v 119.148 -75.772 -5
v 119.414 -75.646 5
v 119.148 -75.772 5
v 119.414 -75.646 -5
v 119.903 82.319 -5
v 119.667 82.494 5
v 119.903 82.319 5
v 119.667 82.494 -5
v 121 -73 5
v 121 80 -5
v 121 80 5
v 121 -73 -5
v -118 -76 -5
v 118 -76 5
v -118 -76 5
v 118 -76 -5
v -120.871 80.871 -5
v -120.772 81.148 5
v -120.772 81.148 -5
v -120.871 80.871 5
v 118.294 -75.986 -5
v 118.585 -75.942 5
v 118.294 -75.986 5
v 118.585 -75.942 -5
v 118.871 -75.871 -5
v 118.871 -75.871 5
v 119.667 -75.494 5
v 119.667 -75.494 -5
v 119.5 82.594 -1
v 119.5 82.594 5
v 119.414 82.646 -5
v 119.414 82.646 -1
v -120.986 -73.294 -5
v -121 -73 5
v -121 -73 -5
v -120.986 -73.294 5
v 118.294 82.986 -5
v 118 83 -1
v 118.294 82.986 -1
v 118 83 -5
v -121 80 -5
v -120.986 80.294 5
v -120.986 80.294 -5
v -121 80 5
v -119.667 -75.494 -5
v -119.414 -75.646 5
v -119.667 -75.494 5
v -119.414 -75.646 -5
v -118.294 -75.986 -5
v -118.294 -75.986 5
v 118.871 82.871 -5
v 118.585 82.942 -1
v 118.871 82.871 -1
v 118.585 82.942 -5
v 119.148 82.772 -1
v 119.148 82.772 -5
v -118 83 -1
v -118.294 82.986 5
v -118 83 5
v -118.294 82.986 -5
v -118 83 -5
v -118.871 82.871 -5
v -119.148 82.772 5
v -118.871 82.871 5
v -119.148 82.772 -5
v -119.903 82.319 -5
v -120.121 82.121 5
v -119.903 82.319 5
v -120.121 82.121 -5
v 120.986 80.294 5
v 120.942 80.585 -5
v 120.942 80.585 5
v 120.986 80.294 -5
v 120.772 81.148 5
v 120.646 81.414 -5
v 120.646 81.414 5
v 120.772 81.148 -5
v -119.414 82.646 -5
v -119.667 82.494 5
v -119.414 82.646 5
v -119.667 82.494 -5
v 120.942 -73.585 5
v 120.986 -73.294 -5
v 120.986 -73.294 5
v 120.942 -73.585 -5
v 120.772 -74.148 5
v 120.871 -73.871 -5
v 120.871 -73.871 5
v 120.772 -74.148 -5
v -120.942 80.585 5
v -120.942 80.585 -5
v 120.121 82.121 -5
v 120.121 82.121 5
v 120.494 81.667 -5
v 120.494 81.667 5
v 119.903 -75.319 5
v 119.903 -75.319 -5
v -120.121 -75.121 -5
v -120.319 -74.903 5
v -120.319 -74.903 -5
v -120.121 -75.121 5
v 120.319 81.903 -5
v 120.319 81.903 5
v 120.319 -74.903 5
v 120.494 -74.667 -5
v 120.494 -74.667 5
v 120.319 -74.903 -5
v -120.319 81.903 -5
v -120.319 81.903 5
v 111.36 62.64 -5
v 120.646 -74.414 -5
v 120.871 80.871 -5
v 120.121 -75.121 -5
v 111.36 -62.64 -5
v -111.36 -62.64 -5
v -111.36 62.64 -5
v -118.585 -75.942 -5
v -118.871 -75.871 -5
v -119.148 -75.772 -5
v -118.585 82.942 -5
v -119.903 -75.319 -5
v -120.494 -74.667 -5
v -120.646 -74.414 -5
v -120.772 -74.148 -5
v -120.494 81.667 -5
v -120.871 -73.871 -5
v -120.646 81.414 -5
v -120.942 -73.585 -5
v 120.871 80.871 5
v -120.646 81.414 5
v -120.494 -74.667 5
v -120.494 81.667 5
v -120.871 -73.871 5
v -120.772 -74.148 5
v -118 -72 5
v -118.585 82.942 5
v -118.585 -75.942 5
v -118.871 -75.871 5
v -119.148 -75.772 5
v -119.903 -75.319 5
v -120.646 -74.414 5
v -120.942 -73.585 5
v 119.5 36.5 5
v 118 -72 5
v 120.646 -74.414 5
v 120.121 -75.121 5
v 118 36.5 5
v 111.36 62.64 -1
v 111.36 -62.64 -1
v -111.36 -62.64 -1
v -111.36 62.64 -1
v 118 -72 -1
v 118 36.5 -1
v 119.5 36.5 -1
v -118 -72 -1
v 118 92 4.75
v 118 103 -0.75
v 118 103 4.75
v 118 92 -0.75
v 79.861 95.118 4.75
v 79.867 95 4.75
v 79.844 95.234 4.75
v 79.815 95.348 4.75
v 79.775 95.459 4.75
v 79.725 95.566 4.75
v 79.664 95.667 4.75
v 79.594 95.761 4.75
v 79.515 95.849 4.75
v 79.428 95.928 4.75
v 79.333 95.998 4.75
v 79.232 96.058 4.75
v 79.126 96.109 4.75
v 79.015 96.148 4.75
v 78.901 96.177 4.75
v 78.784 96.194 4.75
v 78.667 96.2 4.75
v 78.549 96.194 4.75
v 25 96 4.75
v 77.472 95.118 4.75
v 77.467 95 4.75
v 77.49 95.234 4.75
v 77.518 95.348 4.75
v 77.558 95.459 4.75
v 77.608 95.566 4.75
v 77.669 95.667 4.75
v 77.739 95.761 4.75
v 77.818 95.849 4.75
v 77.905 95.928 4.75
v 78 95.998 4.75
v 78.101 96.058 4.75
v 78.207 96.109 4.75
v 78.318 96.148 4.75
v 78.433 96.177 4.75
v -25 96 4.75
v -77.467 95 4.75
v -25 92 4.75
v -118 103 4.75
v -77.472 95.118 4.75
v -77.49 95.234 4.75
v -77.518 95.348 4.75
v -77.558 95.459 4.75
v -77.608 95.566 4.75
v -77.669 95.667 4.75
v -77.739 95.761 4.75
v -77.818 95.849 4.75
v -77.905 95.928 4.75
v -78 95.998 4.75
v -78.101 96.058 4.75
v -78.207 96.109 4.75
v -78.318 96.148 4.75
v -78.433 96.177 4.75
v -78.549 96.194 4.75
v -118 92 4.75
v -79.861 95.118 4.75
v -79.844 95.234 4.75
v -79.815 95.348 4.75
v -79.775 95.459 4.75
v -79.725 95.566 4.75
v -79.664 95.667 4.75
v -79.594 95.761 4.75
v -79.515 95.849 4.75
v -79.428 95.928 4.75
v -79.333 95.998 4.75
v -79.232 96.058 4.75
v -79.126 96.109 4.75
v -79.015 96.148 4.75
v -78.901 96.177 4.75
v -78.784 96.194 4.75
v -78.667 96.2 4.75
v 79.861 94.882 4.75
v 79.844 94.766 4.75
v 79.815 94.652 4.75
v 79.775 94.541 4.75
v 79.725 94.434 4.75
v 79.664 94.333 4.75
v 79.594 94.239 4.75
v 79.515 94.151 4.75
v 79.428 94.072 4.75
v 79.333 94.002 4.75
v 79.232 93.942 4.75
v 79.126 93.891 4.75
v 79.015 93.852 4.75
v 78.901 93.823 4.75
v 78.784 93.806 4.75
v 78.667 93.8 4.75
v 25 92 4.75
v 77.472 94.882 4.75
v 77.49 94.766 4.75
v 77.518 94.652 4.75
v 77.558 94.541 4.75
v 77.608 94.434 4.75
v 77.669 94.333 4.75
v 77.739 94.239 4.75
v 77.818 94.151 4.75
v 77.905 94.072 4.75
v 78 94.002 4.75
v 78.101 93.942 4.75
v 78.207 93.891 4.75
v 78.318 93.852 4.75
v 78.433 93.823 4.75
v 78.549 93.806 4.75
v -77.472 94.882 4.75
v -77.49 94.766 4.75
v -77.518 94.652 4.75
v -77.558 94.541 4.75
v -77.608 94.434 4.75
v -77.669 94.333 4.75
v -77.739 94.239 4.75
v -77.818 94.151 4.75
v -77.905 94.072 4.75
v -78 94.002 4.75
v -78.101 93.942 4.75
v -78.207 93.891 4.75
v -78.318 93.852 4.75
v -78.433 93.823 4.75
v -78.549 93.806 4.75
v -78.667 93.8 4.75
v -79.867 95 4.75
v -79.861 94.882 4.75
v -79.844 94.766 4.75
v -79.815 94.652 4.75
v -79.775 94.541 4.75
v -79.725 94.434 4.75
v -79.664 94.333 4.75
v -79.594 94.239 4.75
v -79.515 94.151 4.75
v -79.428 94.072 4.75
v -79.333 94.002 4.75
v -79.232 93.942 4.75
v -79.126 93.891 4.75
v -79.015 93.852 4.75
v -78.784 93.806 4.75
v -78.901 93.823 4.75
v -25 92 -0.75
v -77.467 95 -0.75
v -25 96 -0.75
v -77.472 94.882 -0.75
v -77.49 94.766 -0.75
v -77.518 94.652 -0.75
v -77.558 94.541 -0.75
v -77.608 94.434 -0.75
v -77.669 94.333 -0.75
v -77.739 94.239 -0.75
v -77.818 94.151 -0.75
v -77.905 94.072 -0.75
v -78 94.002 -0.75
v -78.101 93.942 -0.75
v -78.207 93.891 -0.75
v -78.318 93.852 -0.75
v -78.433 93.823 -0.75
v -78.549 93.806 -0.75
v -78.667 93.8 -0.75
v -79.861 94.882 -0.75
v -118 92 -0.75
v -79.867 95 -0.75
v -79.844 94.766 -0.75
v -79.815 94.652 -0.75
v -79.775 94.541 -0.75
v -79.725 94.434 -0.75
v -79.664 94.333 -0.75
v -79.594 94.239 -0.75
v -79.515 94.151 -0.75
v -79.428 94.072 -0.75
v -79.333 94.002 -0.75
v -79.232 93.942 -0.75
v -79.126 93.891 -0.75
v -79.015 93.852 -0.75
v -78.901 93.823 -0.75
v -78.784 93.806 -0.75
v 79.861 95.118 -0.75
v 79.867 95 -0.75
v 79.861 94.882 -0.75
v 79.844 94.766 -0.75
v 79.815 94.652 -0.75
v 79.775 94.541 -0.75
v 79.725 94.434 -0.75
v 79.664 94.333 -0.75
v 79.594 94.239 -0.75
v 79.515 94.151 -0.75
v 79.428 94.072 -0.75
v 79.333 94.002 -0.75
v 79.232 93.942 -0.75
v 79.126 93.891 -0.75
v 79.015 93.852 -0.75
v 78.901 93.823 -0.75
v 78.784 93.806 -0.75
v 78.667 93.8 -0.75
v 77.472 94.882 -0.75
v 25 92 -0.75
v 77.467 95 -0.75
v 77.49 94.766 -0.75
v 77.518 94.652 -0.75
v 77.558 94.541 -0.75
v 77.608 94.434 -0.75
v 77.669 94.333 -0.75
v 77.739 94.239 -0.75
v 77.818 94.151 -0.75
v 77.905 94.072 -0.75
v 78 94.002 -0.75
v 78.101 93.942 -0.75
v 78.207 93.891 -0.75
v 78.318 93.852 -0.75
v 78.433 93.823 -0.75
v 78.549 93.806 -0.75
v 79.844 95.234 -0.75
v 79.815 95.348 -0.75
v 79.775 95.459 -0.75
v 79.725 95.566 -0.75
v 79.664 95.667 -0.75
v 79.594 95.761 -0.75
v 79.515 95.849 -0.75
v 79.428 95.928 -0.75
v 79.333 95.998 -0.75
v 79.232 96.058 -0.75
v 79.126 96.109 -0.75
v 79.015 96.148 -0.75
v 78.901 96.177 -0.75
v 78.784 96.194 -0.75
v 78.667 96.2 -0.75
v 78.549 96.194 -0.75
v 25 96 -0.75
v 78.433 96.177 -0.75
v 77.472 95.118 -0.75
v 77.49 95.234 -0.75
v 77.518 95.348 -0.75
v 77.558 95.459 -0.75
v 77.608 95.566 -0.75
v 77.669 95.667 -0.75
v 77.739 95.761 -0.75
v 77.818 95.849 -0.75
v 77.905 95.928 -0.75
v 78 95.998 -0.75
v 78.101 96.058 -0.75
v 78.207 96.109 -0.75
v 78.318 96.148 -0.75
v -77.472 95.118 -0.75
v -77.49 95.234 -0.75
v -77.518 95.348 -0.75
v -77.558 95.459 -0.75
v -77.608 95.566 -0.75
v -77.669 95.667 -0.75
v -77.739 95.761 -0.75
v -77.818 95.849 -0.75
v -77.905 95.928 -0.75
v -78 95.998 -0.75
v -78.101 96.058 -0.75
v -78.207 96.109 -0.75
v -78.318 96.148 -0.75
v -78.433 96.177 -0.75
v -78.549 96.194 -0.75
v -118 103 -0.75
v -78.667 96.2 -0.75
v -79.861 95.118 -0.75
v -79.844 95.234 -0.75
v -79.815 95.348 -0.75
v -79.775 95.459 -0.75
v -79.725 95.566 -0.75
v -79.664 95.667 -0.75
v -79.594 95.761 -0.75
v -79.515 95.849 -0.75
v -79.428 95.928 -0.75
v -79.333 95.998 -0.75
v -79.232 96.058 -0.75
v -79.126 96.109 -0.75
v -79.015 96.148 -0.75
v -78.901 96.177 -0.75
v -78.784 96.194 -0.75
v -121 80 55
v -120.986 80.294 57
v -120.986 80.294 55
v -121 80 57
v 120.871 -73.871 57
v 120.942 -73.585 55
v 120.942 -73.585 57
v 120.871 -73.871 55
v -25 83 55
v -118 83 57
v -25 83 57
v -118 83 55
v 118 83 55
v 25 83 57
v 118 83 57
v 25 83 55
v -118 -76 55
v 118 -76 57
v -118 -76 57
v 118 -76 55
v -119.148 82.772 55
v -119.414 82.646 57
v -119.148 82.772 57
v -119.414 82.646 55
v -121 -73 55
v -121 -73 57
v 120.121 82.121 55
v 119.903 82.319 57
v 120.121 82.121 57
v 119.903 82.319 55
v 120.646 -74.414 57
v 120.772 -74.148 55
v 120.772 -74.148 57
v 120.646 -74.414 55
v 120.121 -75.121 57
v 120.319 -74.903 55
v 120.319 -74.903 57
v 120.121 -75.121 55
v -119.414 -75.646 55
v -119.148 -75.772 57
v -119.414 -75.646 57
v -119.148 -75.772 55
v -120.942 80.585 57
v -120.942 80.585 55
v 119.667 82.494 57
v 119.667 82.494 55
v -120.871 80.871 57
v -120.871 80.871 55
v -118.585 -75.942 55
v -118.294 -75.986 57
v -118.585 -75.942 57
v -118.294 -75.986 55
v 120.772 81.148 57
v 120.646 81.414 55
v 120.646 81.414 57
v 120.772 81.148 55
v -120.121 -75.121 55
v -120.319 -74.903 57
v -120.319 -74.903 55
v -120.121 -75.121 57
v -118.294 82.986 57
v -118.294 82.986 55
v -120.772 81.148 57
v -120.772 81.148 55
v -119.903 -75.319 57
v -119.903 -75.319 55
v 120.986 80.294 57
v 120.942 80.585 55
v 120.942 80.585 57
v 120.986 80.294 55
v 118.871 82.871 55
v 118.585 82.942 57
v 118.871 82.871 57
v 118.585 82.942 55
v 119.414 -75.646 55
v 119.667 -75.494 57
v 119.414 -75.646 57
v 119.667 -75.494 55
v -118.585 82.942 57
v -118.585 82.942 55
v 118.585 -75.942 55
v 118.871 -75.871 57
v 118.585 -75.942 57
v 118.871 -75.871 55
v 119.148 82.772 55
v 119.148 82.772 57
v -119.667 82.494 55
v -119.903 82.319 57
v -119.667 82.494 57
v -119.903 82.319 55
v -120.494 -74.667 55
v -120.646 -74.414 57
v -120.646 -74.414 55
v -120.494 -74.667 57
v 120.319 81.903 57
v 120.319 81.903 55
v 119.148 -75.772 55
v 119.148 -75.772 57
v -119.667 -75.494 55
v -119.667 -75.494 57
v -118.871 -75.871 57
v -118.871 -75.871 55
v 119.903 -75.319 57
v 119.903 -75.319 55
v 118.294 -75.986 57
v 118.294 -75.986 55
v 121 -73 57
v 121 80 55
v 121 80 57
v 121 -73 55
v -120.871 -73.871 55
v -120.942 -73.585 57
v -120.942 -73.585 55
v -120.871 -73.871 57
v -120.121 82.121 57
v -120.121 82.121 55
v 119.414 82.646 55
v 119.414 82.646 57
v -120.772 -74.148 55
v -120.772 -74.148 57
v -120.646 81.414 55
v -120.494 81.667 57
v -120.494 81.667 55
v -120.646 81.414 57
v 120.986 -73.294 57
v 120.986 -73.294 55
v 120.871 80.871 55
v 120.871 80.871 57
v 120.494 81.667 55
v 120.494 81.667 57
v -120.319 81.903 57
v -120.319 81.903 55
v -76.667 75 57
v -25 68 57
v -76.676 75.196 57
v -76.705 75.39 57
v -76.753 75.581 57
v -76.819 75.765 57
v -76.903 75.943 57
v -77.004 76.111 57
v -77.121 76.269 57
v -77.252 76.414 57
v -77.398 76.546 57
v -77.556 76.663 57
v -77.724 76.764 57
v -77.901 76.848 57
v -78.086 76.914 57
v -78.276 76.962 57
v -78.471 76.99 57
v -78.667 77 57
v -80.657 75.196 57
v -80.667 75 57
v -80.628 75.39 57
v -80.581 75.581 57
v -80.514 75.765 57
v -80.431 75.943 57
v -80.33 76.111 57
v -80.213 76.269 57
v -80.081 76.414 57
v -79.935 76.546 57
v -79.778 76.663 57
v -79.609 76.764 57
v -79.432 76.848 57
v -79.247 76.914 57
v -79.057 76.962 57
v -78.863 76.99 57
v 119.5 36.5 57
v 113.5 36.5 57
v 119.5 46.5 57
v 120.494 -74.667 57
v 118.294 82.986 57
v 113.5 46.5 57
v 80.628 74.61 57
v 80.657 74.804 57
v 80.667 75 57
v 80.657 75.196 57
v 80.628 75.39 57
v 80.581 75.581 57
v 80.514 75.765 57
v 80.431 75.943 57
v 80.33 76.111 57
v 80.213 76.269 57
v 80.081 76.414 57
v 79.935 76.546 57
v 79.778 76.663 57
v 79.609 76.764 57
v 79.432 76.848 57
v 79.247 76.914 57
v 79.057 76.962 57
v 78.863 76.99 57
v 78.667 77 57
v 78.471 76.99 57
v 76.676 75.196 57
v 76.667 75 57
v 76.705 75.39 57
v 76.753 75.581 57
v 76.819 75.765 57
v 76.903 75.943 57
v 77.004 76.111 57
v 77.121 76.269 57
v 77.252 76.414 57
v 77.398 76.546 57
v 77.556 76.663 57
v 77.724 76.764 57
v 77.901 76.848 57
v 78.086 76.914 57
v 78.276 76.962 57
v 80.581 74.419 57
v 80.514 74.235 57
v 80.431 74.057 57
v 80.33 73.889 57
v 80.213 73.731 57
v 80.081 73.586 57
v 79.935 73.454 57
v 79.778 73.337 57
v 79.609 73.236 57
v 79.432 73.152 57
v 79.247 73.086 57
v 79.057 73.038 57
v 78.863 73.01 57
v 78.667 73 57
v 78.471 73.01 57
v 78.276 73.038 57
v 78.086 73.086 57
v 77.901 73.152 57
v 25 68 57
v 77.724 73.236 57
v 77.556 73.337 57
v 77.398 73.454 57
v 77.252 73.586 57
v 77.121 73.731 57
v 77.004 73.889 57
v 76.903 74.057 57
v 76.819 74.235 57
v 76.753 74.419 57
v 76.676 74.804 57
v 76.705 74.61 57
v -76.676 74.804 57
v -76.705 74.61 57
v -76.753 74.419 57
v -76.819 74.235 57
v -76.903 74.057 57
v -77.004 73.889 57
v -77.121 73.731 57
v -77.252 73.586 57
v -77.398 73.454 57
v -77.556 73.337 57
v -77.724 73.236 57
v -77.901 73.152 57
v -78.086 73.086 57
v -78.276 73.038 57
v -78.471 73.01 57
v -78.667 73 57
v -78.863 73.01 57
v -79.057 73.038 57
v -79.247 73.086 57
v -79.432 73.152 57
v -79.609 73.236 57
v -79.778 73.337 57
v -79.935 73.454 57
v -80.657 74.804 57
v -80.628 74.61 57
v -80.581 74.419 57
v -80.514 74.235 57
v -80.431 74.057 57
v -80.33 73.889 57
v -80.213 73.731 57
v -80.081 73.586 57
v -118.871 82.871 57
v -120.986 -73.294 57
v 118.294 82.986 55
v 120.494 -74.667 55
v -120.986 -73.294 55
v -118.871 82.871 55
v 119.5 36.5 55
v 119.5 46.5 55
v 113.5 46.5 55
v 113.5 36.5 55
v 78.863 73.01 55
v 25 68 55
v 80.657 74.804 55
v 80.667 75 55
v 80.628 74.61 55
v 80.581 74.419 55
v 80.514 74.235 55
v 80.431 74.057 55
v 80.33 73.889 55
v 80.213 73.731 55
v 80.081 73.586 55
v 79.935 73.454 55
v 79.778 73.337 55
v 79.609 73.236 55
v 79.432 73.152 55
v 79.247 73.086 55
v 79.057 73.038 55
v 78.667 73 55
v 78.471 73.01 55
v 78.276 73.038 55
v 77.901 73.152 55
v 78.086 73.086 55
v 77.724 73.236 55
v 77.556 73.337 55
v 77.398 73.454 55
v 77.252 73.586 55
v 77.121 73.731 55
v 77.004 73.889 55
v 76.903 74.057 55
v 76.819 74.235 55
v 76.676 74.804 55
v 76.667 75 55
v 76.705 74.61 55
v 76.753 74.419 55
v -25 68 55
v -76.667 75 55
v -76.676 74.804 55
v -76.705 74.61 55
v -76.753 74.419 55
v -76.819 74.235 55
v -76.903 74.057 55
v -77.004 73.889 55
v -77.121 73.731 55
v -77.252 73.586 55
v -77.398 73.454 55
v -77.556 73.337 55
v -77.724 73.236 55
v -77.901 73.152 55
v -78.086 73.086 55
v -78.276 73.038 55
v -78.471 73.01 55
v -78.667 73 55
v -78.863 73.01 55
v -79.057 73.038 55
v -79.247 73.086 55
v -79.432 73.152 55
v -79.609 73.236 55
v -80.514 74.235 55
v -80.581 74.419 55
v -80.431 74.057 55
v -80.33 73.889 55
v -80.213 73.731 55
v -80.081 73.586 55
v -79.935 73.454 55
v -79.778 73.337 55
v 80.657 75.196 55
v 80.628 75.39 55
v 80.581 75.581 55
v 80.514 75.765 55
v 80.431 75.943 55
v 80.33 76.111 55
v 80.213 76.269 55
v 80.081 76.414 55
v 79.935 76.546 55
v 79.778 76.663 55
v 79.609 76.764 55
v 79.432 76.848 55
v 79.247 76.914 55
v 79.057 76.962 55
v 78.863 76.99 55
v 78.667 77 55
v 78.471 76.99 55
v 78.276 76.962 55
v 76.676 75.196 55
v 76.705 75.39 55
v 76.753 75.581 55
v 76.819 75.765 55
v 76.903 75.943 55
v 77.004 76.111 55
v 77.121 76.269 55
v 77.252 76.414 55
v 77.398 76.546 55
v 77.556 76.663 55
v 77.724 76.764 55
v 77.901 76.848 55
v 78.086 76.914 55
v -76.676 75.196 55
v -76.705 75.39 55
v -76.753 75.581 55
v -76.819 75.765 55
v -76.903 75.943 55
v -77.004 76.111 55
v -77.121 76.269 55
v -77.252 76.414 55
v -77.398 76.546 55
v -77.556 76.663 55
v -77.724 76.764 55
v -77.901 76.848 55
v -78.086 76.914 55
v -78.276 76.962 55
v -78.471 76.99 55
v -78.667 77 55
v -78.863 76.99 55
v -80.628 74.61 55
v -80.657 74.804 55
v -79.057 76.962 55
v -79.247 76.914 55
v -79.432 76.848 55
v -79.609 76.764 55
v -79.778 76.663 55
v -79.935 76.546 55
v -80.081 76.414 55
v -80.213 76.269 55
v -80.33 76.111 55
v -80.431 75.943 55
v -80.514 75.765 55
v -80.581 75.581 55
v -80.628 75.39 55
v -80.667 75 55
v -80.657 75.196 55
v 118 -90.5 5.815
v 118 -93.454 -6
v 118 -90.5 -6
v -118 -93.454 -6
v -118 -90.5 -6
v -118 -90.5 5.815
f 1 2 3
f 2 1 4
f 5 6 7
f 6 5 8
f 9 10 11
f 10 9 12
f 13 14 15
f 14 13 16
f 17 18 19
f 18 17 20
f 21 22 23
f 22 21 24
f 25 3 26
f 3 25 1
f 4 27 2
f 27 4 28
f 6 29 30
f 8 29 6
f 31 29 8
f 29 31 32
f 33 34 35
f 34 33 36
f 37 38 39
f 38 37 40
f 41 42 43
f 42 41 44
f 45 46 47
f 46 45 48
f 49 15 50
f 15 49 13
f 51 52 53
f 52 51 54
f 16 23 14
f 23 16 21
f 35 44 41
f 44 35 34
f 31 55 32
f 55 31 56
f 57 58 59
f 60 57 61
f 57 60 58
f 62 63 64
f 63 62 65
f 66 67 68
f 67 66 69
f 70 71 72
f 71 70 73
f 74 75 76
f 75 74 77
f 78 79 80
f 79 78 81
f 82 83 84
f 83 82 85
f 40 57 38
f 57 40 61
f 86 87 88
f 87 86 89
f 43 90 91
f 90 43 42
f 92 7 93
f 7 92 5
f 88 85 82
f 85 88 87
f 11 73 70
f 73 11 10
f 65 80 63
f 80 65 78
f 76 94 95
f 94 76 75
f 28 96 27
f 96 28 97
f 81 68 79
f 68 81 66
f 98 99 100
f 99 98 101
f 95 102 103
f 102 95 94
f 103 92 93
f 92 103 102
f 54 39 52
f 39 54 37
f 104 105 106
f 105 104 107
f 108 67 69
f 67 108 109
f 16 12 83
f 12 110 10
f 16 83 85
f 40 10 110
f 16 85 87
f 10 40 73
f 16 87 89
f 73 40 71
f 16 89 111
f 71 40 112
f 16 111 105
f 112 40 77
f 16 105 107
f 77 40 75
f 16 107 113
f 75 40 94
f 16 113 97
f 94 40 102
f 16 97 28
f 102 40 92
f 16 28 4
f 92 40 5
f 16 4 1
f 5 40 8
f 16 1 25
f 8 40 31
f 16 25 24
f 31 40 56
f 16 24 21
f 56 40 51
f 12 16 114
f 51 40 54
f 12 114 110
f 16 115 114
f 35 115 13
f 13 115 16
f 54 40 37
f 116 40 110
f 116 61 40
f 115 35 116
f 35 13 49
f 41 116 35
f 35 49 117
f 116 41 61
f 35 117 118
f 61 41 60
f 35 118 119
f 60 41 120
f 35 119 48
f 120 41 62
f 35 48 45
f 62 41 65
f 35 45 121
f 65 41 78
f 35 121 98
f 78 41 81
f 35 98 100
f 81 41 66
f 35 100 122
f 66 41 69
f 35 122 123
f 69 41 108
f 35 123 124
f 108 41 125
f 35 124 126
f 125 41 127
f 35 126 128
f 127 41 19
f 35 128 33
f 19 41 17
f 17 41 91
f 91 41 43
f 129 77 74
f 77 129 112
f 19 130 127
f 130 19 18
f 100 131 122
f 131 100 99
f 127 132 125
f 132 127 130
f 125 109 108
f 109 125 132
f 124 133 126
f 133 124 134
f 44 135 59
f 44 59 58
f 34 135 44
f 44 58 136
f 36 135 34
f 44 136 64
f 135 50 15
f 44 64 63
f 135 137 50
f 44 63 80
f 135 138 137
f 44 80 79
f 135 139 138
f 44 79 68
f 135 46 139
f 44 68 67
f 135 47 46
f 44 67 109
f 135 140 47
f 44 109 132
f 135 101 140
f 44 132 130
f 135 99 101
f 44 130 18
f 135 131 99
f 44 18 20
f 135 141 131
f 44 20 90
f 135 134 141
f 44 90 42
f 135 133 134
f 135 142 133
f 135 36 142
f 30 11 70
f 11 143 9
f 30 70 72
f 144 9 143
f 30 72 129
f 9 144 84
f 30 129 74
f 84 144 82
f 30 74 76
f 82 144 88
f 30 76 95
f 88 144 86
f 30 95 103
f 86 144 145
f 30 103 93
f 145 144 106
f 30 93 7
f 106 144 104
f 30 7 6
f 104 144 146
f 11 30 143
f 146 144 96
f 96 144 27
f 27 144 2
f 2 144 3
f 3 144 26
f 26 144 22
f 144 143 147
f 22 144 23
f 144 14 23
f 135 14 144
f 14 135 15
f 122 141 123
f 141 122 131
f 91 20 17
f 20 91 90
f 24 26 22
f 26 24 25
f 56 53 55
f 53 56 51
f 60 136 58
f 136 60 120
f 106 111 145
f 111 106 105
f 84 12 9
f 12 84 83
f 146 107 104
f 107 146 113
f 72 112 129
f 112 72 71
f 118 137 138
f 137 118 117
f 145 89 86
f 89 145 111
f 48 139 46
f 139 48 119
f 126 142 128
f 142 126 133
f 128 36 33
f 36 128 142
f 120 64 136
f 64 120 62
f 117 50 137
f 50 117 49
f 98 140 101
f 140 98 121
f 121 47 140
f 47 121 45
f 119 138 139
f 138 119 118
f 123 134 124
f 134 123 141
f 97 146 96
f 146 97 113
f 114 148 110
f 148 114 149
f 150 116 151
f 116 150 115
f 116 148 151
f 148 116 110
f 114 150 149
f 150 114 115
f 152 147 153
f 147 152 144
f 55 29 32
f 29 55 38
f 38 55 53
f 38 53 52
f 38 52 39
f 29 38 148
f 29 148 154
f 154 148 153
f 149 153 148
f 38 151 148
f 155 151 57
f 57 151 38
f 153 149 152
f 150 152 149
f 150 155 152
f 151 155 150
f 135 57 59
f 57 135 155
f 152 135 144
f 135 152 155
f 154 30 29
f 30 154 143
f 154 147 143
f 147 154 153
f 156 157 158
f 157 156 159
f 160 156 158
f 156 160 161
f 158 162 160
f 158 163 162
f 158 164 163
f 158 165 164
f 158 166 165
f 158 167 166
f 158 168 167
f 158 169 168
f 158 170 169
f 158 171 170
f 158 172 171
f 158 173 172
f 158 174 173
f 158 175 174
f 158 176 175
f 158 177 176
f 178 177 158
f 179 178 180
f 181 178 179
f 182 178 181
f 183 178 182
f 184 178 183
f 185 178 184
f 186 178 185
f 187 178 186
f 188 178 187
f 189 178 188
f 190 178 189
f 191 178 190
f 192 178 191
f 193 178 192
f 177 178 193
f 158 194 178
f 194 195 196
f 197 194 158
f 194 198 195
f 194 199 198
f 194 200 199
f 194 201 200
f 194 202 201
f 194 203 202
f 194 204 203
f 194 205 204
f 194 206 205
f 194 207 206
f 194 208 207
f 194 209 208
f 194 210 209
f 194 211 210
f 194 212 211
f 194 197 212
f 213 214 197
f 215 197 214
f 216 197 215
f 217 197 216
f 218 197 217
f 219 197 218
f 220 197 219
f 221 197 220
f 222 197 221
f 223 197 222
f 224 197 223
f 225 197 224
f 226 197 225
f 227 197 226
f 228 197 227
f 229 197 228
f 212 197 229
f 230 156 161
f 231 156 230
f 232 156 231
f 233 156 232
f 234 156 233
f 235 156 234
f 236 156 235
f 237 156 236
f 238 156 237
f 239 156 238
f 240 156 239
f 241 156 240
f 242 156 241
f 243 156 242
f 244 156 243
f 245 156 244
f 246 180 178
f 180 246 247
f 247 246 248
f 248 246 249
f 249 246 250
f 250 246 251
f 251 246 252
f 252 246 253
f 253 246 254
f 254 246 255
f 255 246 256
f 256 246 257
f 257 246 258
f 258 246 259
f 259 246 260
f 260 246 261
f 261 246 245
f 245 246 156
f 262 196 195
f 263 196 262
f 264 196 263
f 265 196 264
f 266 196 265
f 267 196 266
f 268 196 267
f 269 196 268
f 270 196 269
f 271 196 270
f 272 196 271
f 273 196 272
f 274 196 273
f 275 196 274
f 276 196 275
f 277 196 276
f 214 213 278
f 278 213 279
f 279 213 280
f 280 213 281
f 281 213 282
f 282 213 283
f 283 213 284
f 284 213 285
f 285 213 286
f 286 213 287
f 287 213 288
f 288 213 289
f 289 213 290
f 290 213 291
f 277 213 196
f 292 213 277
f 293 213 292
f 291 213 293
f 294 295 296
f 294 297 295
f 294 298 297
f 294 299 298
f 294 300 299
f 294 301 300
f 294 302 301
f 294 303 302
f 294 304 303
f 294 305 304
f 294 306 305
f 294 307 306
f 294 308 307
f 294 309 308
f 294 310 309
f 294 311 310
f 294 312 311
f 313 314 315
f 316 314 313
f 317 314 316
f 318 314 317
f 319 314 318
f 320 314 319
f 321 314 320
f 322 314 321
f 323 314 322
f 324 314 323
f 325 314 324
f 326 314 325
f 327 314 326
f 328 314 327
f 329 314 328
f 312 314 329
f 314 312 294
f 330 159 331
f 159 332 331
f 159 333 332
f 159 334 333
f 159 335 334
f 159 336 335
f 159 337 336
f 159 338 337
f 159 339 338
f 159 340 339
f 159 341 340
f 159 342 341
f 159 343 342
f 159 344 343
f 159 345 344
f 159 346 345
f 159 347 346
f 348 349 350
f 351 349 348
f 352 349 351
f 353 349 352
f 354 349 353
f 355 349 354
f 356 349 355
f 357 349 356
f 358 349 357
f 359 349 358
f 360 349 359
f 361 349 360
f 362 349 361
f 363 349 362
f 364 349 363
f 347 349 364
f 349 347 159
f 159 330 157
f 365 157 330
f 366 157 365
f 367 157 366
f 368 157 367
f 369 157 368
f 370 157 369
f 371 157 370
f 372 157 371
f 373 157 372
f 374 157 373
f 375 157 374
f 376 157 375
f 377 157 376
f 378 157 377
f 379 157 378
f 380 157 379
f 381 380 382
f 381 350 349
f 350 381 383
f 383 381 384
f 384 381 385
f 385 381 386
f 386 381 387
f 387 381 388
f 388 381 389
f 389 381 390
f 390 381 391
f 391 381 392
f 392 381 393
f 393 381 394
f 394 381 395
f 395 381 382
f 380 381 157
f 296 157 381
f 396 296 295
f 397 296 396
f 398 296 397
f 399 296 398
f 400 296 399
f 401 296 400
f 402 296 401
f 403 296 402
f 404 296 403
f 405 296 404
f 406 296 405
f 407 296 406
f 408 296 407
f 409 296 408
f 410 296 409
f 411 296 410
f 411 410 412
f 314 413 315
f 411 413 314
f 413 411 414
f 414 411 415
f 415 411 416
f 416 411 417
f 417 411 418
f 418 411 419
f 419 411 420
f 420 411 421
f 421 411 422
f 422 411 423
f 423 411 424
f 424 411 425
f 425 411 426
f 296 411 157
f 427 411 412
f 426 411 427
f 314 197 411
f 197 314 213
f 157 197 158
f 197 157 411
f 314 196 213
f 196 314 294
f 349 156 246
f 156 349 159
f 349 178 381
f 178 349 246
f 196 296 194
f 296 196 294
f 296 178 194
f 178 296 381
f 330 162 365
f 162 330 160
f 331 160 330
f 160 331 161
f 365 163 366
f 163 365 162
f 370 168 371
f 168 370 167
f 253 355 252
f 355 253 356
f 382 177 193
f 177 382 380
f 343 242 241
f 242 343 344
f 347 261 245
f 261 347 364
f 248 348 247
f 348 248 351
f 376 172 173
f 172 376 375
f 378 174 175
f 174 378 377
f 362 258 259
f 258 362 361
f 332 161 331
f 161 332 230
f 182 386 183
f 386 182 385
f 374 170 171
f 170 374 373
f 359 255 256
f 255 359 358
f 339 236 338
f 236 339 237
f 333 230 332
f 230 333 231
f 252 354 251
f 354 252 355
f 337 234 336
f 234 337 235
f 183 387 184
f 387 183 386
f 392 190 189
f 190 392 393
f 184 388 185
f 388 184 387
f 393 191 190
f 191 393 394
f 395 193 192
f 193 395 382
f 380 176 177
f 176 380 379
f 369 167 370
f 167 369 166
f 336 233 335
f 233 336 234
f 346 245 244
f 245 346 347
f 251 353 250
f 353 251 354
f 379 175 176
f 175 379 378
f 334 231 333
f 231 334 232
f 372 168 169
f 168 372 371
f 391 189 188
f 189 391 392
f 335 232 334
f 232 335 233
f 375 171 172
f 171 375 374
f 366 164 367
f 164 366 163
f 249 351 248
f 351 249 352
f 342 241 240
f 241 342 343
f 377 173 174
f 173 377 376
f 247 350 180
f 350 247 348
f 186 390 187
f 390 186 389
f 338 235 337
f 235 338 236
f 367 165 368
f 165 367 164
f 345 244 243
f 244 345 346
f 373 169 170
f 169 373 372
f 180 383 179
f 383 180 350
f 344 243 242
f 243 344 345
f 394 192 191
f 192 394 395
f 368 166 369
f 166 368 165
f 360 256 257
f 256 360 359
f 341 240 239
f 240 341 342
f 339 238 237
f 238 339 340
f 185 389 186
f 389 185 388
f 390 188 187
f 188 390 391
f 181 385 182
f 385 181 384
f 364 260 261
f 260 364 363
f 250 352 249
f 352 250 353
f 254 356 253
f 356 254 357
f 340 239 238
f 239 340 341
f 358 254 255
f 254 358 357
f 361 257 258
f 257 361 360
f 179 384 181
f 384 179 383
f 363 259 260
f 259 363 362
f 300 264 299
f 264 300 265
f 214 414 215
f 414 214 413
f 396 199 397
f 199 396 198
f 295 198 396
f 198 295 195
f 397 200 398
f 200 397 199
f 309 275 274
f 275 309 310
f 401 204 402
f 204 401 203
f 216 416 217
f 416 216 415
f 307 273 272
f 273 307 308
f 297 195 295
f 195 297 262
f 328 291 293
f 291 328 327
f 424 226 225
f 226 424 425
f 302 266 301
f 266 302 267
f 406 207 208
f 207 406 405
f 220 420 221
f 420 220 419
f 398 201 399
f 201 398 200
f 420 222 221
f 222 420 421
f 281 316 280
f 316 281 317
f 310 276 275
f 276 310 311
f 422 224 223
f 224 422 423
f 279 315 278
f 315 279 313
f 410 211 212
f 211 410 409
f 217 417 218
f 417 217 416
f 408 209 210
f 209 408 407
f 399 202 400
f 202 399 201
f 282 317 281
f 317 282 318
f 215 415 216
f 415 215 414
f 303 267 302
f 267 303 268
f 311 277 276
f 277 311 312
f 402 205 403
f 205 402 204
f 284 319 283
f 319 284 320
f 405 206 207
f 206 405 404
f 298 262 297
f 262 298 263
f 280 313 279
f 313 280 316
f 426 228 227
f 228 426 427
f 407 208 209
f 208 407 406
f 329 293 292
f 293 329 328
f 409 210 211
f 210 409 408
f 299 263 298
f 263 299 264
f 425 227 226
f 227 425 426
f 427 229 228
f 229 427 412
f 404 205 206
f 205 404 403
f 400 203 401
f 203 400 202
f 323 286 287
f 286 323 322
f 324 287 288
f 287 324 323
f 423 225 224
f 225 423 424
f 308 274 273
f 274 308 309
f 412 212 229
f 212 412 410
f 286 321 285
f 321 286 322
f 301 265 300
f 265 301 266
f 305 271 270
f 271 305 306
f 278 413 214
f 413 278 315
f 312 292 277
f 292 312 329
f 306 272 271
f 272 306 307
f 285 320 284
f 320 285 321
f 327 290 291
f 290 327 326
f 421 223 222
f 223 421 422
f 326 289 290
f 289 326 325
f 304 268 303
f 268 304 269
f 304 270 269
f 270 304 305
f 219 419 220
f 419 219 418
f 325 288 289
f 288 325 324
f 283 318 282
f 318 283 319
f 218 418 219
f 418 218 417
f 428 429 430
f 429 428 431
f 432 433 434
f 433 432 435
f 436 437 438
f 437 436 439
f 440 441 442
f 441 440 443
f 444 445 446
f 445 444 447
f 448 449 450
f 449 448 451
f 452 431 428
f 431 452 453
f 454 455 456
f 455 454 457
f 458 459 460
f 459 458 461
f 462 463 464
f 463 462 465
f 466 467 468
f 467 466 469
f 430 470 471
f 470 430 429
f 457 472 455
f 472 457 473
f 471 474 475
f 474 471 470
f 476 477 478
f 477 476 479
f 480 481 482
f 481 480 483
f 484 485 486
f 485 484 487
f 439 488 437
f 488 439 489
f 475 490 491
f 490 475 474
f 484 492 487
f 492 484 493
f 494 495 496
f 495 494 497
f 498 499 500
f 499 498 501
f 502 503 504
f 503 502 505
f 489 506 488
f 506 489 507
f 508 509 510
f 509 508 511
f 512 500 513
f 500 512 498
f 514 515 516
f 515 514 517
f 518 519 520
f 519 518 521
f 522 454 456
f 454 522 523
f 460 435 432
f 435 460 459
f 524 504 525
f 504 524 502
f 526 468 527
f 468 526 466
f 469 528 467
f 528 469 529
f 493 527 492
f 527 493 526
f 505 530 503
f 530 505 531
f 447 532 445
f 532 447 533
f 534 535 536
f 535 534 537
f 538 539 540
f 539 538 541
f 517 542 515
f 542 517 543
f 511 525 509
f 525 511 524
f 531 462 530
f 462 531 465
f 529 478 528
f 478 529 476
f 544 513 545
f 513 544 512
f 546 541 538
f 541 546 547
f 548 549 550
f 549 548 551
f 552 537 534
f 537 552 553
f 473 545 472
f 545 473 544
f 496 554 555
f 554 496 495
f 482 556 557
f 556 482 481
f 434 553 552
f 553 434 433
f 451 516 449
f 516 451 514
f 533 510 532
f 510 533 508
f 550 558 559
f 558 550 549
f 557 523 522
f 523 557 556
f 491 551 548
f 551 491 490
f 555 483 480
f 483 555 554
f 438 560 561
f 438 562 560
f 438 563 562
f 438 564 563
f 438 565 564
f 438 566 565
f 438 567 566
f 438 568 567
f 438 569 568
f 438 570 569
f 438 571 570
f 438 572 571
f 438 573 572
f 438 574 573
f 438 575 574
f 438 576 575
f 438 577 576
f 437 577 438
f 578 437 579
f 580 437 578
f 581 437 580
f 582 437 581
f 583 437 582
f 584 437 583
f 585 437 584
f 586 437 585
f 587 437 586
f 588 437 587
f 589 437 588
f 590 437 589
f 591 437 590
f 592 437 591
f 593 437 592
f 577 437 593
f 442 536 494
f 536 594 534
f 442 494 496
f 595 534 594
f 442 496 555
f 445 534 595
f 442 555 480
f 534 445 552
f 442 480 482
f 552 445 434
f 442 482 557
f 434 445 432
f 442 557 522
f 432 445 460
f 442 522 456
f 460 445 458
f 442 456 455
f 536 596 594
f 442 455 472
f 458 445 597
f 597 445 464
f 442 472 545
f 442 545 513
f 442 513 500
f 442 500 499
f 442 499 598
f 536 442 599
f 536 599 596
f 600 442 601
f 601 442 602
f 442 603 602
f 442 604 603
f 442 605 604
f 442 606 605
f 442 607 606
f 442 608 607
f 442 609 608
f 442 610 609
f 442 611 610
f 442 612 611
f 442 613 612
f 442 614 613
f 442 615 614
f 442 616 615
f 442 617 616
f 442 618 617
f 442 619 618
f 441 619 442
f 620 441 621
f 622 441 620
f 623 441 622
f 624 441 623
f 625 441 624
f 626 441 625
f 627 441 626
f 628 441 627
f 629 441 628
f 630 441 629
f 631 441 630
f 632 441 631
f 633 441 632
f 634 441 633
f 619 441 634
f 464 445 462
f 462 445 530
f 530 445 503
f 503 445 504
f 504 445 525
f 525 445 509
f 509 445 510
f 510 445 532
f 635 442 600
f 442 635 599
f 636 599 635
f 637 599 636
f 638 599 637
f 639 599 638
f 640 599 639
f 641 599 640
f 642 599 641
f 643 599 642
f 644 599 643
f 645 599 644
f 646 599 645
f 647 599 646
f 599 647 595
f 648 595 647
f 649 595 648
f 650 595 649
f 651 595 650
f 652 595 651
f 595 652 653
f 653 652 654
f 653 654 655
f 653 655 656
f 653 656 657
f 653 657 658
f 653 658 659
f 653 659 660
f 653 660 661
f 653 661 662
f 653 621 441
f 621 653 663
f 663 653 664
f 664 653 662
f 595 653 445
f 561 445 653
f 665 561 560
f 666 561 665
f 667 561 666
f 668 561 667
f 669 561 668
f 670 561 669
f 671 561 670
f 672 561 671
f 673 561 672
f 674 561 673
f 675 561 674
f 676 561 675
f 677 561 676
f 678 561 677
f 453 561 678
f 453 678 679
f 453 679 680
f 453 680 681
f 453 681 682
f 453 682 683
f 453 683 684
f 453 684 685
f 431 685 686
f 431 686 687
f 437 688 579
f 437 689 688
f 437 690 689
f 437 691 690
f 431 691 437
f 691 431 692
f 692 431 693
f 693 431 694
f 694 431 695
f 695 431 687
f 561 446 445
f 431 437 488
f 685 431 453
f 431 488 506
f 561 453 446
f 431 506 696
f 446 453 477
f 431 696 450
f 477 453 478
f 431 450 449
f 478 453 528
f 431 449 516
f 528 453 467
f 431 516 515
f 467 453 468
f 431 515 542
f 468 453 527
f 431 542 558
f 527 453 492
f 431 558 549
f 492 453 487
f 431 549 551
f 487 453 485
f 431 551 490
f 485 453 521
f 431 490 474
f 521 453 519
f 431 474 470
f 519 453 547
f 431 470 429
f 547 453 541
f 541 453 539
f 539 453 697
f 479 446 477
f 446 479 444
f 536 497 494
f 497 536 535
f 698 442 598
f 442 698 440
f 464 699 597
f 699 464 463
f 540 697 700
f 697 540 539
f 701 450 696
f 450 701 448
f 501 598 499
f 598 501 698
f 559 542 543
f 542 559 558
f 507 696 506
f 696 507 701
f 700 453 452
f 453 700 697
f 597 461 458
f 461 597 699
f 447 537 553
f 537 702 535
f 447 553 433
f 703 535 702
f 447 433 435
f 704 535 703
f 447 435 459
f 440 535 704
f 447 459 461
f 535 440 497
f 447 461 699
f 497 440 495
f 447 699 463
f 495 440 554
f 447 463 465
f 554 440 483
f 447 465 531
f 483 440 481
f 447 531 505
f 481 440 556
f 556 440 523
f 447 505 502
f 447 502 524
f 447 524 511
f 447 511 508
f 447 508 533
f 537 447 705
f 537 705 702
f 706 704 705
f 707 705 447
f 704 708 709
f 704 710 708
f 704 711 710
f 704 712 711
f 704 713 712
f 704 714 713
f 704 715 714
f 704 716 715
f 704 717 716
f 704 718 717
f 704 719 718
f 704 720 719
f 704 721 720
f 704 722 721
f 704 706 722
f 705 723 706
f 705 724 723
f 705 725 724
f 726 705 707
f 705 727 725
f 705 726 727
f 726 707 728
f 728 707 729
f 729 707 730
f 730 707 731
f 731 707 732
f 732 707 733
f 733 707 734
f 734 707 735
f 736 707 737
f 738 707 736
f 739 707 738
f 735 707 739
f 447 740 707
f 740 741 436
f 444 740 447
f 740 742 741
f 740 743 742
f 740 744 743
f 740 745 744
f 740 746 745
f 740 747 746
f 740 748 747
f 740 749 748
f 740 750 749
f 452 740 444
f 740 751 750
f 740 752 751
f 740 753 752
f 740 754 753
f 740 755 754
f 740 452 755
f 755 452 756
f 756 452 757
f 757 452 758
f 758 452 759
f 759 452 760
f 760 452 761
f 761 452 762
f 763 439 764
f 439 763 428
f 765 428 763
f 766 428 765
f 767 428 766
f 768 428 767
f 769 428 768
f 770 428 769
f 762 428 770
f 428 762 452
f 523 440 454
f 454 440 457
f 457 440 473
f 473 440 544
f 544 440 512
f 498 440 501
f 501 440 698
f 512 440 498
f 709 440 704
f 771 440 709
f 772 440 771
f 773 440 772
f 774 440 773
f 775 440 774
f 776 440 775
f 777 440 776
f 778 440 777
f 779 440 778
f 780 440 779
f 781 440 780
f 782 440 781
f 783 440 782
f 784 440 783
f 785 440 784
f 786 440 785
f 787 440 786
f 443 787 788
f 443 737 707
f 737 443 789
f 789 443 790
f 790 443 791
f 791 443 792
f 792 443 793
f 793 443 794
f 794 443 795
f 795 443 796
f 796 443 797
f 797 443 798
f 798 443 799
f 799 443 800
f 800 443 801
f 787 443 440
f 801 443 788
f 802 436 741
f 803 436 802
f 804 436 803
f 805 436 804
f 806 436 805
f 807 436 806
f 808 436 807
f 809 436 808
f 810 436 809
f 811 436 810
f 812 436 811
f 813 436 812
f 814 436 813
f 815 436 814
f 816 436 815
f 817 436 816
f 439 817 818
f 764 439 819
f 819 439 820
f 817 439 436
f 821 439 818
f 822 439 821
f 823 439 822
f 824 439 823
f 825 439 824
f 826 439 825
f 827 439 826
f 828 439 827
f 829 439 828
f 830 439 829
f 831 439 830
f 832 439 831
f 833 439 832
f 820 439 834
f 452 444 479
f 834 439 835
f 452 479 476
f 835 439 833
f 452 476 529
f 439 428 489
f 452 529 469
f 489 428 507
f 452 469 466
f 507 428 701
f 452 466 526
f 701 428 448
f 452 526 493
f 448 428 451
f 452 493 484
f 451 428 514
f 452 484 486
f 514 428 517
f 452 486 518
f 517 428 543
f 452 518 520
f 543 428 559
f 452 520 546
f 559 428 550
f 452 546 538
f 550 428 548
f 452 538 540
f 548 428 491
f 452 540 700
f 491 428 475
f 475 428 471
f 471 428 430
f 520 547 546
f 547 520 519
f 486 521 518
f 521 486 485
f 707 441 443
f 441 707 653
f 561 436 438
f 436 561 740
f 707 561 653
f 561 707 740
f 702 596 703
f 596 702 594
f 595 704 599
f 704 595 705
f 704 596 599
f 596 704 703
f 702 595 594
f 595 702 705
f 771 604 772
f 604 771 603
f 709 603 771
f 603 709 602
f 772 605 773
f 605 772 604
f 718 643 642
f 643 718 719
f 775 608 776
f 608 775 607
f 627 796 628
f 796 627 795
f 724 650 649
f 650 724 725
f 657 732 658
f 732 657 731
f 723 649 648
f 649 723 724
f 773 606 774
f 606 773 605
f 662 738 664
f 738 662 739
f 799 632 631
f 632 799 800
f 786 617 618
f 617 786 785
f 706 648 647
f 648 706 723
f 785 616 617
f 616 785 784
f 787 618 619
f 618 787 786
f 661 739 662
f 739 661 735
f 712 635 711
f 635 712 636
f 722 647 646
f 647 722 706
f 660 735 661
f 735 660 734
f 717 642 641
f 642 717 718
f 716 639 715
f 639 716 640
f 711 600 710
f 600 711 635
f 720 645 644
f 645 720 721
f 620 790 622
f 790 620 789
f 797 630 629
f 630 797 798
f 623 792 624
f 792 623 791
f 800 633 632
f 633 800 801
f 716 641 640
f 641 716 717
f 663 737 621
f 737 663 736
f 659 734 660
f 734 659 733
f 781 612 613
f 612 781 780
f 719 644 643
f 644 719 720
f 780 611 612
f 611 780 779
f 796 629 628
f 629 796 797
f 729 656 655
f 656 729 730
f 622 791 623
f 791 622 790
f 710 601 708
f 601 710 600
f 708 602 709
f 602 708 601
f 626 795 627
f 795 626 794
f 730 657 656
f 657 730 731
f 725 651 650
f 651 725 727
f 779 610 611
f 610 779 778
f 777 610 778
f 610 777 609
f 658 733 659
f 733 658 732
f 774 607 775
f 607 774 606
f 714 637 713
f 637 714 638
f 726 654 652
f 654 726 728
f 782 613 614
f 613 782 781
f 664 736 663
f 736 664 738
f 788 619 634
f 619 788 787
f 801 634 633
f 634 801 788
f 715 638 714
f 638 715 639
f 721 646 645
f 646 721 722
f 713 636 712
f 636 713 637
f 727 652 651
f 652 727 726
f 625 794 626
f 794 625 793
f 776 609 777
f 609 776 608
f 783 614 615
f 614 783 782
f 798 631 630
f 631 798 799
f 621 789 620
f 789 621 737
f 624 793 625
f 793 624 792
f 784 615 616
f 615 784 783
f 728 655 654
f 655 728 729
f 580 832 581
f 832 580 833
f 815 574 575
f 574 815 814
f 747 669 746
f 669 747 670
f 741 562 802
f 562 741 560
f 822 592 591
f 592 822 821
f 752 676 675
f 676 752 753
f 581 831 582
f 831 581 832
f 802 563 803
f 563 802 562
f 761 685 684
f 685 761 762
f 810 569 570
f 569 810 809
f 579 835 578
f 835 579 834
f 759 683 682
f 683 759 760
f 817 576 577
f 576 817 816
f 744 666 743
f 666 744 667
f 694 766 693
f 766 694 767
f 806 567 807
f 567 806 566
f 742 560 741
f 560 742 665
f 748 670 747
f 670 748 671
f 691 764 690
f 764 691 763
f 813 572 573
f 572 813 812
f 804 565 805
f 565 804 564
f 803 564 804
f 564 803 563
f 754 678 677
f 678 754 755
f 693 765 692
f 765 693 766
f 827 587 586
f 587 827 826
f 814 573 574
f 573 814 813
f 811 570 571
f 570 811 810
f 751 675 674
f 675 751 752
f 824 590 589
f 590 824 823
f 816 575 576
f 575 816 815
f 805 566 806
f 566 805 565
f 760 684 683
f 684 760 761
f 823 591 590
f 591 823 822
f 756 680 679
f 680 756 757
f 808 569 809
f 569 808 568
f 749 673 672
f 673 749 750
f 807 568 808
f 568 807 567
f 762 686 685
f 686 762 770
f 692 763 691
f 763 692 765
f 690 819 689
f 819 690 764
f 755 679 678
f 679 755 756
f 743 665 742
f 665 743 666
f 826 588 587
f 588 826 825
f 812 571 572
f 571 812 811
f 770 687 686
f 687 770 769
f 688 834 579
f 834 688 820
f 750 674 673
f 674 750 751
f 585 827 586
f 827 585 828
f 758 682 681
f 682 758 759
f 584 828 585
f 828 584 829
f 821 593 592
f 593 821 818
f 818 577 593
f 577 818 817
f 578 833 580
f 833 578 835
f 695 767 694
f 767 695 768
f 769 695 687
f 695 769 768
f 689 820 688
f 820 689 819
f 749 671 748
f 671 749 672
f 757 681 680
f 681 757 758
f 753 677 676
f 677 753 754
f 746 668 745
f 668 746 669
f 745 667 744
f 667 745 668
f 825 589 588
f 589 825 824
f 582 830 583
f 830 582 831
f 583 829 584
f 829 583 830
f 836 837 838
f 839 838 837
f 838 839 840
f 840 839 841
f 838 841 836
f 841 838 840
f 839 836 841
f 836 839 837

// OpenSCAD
$fn = 64;
bodyWidth = 235+1;
bodyHeight = 143+1;
bodyDepth = 5+1;

displayWidth = 222.72;
displayHeight = 125.28;

displayChin = 11;
frontDepth = 4;
sideDepth = 3;
topDepth = 4;
backingDepth = 2;

module roundedcube(xdim, ydim, zdim, rdim)
{
	hull()
	{
		translate([-xdim/2+rdim,-ydim/2+rdim,0])	cylinder(h=zdim,r=rdim, center=true);
		translate([xdim/2-rdim,-ydim/2+rdim,0])	cylinder(h=zdim,r=rdim, center=true);
		translate([-xdim/2+rdim,ydim/2-rdim,0])	cylinder(h=zdim,r=rdim, center=true);
		translate([xdim/2-rdim,ydim/2-rdim,0])		cylinder(h=zdim,r=rdim, center=true);
	}
}

module frame()
{
	difference()
	{
		translate([0,(displayChin-topDepth)/2,0])
		{
			roundedcube(bodyWidth+sideDepth*2, bodyHeight+displayChin+topDepth, bodyDepth+frontDepth, 3);
		}
		cube([displayWidth, displayHeight, bodyDepth+frontDepth], center=true);
		translate([0,displayChin/2,frontDepth/2])
		{
			cube([bodyWidth, bodyHeight+displayChin, bodyDepth], center=true);
		}
		translate([(bodyWidth+1.5)/2, (displayChin+bodyHeight-35.5)/2, frontDepth/2])
		{
			cube([1.5,35.5+displayChin,bodyDepth], center=true);
		}	
	}
}

module brace()
{
		difference()
		{
			cube([bodyWidth, displayChin, bodyDepth-0.5], center=true);
			translate([0,-(displayChin-4)/2, 0])
			{
				cube([50,4,bodyDepth], center=true);
			}
			translate([bodyWidth/3, -displayChin/2+3, 0])	cylinder(r=1.2, h=bodyDepth+1, center=true);
			translate([-bodyWidth/3, -displayChin/2+3, 0])	cylinder(r=1.2, h=bodyDepth+1, center=true);
		}
	
}

module trim()
{
	difference()
	{
		cube([bodyWidth, 3, backingDepth + bodyDepth + topDepth], center=true);

		translate([0, -1.5, 0])
		{
			rotate([-atan2(3,backingDepth + bodyDepth + topDepth),0,0])
			{
				cube([bodyWidth, 3, 2*(backingDepth + bodyDepth + topDepth)], center=true);
			}
		}
	}
}

module backing()
{
	difference()
	{
		translate([0,(displayChin-topDepth)/2,0])
		{
			roundedcube(bodyWidth+sideDepth*2, bodyHeight+topDepth+displayChin, backingDepth, 3);
		}	
		translate([0,(bodyHeight-15)/2 + displayChin, 0])
		{
			cube([50,15,backingDepth], center=true);
		}
		translate([(bodyWidth-3)/2, bodyHeight/2-30.5, 0])
		{
			cube([6,10,bodyDepth], center=true);
		}
		translate([bodyWidth/3, bodyHeight/2+displayChin-displayChin+3, 0])	cylinder(r=2, h=bodyDepth+1, center=true);
		translate([-bodyWidth/3, bodyHeight/2+displayChin-displayChin+3, 0])	cylinder(r=2, h=bodyDepth+1, center=true);
	}	
}
frame();
translate([0,20+(bodyHeight+displayChin)/2,frontDepth/2])
{
	brace();
}
translate([0,0,50+(bodyDepth+frontDepth+backingDepth)/2])
{
	backing();
}

translate([0,-(bodyHeight/2 + 20), 0])
{
	trim();
}
